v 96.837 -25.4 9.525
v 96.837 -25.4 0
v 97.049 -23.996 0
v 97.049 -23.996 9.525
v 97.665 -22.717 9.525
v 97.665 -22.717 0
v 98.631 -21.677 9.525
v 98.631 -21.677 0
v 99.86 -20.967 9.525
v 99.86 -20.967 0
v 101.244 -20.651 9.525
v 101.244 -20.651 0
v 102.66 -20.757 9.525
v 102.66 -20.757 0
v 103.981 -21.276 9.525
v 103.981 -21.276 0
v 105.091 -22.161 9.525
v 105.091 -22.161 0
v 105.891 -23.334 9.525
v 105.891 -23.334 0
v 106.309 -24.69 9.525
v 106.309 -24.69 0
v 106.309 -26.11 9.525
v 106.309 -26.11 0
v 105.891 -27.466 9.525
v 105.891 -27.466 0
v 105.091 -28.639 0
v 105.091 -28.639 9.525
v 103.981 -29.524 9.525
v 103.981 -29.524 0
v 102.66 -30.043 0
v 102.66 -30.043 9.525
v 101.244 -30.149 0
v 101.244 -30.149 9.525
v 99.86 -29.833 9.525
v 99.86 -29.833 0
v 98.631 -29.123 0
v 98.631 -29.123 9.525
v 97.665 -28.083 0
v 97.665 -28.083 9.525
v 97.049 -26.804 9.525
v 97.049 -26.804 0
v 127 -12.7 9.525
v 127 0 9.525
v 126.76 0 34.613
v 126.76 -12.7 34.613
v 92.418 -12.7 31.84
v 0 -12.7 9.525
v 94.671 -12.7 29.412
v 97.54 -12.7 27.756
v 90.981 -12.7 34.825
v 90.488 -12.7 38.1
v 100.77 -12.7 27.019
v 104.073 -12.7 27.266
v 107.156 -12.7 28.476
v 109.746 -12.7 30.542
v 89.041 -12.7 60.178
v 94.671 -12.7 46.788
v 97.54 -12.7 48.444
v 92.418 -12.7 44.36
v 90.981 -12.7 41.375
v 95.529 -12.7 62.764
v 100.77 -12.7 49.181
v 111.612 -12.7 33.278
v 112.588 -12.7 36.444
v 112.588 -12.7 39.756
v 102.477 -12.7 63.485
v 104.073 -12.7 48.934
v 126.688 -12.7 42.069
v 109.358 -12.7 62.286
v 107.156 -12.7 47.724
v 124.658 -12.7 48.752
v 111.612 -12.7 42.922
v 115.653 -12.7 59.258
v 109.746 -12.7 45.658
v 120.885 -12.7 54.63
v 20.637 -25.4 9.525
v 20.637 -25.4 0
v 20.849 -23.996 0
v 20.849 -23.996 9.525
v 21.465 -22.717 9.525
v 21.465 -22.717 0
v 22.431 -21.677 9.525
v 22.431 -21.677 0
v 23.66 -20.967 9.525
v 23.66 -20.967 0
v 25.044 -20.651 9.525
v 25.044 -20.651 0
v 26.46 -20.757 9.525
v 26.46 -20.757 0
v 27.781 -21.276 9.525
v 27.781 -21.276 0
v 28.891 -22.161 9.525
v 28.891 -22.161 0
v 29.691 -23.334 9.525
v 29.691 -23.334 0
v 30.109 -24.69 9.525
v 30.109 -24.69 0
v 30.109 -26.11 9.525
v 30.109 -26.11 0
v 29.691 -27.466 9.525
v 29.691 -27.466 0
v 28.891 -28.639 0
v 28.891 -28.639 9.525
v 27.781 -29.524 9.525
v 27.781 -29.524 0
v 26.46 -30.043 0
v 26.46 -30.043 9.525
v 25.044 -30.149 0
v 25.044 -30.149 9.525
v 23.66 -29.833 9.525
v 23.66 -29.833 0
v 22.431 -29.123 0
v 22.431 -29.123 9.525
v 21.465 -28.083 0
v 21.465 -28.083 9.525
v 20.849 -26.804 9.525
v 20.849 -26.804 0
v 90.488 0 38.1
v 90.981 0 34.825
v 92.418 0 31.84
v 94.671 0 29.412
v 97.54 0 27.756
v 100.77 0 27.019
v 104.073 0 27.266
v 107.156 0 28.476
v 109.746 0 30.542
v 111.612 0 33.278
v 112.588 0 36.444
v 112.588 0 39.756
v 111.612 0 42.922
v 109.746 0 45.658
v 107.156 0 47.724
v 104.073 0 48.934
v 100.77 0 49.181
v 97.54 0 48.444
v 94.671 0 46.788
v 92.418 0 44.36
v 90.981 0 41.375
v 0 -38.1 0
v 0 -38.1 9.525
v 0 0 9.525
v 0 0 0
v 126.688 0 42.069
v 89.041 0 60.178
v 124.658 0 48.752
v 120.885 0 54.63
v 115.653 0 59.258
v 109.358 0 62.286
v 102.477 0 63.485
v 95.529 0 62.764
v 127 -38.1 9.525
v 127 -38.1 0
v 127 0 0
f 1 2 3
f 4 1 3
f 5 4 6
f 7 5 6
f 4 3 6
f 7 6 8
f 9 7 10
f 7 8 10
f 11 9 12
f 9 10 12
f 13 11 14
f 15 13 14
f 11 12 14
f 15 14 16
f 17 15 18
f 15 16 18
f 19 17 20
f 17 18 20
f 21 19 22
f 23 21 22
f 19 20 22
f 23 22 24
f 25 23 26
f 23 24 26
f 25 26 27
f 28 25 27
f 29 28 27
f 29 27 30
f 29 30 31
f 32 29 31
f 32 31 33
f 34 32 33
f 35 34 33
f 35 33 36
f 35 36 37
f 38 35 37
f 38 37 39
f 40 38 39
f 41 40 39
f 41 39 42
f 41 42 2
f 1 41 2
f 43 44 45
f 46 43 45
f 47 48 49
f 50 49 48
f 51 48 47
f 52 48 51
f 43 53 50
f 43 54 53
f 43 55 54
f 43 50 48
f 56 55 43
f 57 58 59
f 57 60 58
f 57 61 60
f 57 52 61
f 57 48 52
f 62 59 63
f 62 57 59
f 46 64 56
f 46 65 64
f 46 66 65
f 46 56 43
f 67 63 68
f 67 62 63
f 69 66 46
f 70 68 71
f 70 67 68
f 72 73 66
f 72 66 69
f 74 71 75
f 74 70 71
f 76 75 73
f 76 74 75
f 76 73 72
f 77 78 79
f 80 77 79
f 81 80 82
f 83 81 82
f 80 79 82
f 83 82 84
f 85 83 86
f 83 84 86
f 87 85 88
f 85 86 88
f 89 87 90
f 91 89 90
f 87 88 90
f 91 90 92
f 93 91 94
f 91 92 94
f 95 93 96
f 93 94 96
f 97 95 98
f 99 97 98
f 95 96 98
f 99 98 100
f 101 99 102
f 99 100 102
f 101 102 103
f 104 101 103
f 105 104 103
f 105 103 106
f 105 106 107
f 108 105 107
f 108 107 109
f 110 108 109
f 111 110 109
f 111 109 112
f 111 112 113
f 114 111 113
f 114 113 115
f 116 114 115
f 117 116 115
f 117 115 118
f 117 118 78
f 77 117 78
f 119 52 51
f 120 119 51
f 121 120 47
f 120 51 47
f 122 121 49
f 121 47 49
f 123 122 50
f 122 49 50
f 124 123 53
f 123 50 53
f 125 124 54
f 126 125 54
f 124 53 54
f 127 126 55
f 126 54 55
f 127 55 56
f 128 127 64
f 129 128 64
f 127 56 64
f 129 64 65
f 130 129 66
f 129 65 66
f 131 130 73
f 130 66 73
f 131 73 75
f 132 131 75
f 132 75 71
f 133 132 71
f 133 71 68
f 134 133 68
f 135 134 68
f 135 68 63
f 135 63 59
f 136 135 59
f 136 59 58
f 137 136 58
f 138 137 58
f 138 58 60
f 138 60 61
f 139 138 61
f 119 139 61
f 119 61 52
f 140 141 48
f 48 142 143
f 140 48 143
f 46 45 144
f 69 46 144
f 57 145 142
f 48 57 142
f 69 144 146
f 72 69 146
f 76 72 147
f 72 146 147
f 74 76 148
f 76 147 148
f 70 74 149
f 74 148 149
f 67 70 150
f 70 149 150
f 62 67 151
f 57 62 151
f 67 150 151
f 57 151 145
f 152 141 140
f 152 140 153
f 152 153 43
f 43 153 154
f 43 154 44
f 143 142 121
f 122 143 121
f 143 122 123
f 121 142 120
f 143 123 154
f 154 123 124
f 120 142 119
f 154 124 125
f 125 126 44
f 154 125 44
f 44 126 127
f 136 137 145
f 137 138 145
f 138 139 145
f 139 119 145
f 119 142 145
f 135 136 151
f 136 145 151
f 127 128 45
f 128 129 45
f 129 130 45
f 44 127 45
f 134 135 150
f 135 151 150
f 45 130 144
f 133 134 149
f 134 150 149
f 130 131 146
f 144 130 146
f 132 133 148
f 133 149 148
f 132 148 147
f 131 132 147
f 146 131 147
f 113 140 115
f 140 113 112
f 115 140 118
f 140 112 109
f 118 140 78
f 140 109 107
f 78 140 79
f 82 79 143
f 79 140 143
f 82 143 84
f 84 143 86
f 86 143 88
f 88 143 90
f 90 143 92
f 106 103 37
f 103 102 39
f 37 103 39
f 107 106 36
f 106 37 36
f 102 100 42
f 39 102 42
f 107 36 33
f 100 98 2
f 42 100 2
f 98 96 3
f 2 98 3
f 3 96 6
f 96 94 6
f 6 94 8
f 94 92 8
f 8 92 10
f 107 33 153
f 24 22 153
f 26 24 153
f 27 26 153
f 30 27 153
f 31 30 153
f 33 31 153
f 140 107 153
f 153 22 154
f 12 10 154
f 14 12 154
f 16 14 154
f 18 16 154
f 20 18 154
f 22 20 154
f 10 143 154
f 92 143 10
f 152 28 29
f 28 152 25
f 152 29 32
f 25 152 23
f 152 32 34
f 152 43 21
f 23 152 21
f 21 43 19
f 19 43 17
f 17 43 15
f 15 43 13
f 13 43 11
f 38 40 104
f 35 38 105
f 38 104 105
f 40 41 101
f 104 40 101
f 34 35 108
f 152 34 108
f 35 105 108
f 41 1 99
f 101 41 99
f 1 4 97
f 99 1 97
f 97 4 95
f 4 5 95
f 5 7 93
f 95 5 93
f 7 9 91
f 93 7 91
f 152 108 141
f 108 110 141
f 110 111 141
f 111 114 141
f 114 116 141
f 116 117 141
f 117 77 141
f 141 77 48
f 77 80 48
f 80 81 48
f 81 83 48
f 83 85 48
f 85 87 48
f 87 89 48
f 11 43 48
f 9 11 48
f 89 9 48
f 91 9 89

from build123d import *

# Parameters (mm, degrees)
F1_DEPTH = 38.1
F2_DEPTH = 12.7
F3_D     = 22.225
F5_D     = 9.525
F6_D     = 9.525


with BuildPart() as f1:
    # F0 (on Front) → F1 (new body)
    with BuildSketch(Plane.XZ):
        Polygon((0, 9.525), (0, 0), (127, 0), (127, 9.525), (101.6, 9.525), align=None)
    extrude(amount=F1_DEPTH)

    # F0 (on Front) → F2 (join)
    with BuildSketch(Plane.XZ):
        with BuildLine():
            Line((89.0406588905, 60.1776572782), (0, 9.525))
            Line((0, 9.525), (101.6, 9.525))
            Line((101.6, 9.525), (127, 9.525))
            Line((127, 9.525), (126.7595108524, 34.6130222733))
            Line((126.7595108524, 34.6130222733), (126.6880426637, 42.0686414936))
            ThreePointArc((126.6880426637, 42.0686414936), (112.6102771914, 60.989600175), (89.0406588905, 60.1776572782))
        make_face()
    extrude(amount=F2_DEPTH)

    # F3 (through all)
    with Locations(Plane(origin=(0, 0, 0), x_dir=(1, 0, 0), z_dir=(0, 1, 0))):
        with Locations((101.6, -38.1)):
            Hole(F3_D / 2)

    # F5 (through all)
    with Locations(Plane.XY.offset(9.525)):
        with Locations((25.399999693, -25.4)):
            Hole(F5_D / 2)

    # F6 (through all)
    with Locations(Plane.XY.offset(9.525)):
        with Locations((101.6, -25.4)):
            Hole(F6_D / 2)


solid = f1.part
